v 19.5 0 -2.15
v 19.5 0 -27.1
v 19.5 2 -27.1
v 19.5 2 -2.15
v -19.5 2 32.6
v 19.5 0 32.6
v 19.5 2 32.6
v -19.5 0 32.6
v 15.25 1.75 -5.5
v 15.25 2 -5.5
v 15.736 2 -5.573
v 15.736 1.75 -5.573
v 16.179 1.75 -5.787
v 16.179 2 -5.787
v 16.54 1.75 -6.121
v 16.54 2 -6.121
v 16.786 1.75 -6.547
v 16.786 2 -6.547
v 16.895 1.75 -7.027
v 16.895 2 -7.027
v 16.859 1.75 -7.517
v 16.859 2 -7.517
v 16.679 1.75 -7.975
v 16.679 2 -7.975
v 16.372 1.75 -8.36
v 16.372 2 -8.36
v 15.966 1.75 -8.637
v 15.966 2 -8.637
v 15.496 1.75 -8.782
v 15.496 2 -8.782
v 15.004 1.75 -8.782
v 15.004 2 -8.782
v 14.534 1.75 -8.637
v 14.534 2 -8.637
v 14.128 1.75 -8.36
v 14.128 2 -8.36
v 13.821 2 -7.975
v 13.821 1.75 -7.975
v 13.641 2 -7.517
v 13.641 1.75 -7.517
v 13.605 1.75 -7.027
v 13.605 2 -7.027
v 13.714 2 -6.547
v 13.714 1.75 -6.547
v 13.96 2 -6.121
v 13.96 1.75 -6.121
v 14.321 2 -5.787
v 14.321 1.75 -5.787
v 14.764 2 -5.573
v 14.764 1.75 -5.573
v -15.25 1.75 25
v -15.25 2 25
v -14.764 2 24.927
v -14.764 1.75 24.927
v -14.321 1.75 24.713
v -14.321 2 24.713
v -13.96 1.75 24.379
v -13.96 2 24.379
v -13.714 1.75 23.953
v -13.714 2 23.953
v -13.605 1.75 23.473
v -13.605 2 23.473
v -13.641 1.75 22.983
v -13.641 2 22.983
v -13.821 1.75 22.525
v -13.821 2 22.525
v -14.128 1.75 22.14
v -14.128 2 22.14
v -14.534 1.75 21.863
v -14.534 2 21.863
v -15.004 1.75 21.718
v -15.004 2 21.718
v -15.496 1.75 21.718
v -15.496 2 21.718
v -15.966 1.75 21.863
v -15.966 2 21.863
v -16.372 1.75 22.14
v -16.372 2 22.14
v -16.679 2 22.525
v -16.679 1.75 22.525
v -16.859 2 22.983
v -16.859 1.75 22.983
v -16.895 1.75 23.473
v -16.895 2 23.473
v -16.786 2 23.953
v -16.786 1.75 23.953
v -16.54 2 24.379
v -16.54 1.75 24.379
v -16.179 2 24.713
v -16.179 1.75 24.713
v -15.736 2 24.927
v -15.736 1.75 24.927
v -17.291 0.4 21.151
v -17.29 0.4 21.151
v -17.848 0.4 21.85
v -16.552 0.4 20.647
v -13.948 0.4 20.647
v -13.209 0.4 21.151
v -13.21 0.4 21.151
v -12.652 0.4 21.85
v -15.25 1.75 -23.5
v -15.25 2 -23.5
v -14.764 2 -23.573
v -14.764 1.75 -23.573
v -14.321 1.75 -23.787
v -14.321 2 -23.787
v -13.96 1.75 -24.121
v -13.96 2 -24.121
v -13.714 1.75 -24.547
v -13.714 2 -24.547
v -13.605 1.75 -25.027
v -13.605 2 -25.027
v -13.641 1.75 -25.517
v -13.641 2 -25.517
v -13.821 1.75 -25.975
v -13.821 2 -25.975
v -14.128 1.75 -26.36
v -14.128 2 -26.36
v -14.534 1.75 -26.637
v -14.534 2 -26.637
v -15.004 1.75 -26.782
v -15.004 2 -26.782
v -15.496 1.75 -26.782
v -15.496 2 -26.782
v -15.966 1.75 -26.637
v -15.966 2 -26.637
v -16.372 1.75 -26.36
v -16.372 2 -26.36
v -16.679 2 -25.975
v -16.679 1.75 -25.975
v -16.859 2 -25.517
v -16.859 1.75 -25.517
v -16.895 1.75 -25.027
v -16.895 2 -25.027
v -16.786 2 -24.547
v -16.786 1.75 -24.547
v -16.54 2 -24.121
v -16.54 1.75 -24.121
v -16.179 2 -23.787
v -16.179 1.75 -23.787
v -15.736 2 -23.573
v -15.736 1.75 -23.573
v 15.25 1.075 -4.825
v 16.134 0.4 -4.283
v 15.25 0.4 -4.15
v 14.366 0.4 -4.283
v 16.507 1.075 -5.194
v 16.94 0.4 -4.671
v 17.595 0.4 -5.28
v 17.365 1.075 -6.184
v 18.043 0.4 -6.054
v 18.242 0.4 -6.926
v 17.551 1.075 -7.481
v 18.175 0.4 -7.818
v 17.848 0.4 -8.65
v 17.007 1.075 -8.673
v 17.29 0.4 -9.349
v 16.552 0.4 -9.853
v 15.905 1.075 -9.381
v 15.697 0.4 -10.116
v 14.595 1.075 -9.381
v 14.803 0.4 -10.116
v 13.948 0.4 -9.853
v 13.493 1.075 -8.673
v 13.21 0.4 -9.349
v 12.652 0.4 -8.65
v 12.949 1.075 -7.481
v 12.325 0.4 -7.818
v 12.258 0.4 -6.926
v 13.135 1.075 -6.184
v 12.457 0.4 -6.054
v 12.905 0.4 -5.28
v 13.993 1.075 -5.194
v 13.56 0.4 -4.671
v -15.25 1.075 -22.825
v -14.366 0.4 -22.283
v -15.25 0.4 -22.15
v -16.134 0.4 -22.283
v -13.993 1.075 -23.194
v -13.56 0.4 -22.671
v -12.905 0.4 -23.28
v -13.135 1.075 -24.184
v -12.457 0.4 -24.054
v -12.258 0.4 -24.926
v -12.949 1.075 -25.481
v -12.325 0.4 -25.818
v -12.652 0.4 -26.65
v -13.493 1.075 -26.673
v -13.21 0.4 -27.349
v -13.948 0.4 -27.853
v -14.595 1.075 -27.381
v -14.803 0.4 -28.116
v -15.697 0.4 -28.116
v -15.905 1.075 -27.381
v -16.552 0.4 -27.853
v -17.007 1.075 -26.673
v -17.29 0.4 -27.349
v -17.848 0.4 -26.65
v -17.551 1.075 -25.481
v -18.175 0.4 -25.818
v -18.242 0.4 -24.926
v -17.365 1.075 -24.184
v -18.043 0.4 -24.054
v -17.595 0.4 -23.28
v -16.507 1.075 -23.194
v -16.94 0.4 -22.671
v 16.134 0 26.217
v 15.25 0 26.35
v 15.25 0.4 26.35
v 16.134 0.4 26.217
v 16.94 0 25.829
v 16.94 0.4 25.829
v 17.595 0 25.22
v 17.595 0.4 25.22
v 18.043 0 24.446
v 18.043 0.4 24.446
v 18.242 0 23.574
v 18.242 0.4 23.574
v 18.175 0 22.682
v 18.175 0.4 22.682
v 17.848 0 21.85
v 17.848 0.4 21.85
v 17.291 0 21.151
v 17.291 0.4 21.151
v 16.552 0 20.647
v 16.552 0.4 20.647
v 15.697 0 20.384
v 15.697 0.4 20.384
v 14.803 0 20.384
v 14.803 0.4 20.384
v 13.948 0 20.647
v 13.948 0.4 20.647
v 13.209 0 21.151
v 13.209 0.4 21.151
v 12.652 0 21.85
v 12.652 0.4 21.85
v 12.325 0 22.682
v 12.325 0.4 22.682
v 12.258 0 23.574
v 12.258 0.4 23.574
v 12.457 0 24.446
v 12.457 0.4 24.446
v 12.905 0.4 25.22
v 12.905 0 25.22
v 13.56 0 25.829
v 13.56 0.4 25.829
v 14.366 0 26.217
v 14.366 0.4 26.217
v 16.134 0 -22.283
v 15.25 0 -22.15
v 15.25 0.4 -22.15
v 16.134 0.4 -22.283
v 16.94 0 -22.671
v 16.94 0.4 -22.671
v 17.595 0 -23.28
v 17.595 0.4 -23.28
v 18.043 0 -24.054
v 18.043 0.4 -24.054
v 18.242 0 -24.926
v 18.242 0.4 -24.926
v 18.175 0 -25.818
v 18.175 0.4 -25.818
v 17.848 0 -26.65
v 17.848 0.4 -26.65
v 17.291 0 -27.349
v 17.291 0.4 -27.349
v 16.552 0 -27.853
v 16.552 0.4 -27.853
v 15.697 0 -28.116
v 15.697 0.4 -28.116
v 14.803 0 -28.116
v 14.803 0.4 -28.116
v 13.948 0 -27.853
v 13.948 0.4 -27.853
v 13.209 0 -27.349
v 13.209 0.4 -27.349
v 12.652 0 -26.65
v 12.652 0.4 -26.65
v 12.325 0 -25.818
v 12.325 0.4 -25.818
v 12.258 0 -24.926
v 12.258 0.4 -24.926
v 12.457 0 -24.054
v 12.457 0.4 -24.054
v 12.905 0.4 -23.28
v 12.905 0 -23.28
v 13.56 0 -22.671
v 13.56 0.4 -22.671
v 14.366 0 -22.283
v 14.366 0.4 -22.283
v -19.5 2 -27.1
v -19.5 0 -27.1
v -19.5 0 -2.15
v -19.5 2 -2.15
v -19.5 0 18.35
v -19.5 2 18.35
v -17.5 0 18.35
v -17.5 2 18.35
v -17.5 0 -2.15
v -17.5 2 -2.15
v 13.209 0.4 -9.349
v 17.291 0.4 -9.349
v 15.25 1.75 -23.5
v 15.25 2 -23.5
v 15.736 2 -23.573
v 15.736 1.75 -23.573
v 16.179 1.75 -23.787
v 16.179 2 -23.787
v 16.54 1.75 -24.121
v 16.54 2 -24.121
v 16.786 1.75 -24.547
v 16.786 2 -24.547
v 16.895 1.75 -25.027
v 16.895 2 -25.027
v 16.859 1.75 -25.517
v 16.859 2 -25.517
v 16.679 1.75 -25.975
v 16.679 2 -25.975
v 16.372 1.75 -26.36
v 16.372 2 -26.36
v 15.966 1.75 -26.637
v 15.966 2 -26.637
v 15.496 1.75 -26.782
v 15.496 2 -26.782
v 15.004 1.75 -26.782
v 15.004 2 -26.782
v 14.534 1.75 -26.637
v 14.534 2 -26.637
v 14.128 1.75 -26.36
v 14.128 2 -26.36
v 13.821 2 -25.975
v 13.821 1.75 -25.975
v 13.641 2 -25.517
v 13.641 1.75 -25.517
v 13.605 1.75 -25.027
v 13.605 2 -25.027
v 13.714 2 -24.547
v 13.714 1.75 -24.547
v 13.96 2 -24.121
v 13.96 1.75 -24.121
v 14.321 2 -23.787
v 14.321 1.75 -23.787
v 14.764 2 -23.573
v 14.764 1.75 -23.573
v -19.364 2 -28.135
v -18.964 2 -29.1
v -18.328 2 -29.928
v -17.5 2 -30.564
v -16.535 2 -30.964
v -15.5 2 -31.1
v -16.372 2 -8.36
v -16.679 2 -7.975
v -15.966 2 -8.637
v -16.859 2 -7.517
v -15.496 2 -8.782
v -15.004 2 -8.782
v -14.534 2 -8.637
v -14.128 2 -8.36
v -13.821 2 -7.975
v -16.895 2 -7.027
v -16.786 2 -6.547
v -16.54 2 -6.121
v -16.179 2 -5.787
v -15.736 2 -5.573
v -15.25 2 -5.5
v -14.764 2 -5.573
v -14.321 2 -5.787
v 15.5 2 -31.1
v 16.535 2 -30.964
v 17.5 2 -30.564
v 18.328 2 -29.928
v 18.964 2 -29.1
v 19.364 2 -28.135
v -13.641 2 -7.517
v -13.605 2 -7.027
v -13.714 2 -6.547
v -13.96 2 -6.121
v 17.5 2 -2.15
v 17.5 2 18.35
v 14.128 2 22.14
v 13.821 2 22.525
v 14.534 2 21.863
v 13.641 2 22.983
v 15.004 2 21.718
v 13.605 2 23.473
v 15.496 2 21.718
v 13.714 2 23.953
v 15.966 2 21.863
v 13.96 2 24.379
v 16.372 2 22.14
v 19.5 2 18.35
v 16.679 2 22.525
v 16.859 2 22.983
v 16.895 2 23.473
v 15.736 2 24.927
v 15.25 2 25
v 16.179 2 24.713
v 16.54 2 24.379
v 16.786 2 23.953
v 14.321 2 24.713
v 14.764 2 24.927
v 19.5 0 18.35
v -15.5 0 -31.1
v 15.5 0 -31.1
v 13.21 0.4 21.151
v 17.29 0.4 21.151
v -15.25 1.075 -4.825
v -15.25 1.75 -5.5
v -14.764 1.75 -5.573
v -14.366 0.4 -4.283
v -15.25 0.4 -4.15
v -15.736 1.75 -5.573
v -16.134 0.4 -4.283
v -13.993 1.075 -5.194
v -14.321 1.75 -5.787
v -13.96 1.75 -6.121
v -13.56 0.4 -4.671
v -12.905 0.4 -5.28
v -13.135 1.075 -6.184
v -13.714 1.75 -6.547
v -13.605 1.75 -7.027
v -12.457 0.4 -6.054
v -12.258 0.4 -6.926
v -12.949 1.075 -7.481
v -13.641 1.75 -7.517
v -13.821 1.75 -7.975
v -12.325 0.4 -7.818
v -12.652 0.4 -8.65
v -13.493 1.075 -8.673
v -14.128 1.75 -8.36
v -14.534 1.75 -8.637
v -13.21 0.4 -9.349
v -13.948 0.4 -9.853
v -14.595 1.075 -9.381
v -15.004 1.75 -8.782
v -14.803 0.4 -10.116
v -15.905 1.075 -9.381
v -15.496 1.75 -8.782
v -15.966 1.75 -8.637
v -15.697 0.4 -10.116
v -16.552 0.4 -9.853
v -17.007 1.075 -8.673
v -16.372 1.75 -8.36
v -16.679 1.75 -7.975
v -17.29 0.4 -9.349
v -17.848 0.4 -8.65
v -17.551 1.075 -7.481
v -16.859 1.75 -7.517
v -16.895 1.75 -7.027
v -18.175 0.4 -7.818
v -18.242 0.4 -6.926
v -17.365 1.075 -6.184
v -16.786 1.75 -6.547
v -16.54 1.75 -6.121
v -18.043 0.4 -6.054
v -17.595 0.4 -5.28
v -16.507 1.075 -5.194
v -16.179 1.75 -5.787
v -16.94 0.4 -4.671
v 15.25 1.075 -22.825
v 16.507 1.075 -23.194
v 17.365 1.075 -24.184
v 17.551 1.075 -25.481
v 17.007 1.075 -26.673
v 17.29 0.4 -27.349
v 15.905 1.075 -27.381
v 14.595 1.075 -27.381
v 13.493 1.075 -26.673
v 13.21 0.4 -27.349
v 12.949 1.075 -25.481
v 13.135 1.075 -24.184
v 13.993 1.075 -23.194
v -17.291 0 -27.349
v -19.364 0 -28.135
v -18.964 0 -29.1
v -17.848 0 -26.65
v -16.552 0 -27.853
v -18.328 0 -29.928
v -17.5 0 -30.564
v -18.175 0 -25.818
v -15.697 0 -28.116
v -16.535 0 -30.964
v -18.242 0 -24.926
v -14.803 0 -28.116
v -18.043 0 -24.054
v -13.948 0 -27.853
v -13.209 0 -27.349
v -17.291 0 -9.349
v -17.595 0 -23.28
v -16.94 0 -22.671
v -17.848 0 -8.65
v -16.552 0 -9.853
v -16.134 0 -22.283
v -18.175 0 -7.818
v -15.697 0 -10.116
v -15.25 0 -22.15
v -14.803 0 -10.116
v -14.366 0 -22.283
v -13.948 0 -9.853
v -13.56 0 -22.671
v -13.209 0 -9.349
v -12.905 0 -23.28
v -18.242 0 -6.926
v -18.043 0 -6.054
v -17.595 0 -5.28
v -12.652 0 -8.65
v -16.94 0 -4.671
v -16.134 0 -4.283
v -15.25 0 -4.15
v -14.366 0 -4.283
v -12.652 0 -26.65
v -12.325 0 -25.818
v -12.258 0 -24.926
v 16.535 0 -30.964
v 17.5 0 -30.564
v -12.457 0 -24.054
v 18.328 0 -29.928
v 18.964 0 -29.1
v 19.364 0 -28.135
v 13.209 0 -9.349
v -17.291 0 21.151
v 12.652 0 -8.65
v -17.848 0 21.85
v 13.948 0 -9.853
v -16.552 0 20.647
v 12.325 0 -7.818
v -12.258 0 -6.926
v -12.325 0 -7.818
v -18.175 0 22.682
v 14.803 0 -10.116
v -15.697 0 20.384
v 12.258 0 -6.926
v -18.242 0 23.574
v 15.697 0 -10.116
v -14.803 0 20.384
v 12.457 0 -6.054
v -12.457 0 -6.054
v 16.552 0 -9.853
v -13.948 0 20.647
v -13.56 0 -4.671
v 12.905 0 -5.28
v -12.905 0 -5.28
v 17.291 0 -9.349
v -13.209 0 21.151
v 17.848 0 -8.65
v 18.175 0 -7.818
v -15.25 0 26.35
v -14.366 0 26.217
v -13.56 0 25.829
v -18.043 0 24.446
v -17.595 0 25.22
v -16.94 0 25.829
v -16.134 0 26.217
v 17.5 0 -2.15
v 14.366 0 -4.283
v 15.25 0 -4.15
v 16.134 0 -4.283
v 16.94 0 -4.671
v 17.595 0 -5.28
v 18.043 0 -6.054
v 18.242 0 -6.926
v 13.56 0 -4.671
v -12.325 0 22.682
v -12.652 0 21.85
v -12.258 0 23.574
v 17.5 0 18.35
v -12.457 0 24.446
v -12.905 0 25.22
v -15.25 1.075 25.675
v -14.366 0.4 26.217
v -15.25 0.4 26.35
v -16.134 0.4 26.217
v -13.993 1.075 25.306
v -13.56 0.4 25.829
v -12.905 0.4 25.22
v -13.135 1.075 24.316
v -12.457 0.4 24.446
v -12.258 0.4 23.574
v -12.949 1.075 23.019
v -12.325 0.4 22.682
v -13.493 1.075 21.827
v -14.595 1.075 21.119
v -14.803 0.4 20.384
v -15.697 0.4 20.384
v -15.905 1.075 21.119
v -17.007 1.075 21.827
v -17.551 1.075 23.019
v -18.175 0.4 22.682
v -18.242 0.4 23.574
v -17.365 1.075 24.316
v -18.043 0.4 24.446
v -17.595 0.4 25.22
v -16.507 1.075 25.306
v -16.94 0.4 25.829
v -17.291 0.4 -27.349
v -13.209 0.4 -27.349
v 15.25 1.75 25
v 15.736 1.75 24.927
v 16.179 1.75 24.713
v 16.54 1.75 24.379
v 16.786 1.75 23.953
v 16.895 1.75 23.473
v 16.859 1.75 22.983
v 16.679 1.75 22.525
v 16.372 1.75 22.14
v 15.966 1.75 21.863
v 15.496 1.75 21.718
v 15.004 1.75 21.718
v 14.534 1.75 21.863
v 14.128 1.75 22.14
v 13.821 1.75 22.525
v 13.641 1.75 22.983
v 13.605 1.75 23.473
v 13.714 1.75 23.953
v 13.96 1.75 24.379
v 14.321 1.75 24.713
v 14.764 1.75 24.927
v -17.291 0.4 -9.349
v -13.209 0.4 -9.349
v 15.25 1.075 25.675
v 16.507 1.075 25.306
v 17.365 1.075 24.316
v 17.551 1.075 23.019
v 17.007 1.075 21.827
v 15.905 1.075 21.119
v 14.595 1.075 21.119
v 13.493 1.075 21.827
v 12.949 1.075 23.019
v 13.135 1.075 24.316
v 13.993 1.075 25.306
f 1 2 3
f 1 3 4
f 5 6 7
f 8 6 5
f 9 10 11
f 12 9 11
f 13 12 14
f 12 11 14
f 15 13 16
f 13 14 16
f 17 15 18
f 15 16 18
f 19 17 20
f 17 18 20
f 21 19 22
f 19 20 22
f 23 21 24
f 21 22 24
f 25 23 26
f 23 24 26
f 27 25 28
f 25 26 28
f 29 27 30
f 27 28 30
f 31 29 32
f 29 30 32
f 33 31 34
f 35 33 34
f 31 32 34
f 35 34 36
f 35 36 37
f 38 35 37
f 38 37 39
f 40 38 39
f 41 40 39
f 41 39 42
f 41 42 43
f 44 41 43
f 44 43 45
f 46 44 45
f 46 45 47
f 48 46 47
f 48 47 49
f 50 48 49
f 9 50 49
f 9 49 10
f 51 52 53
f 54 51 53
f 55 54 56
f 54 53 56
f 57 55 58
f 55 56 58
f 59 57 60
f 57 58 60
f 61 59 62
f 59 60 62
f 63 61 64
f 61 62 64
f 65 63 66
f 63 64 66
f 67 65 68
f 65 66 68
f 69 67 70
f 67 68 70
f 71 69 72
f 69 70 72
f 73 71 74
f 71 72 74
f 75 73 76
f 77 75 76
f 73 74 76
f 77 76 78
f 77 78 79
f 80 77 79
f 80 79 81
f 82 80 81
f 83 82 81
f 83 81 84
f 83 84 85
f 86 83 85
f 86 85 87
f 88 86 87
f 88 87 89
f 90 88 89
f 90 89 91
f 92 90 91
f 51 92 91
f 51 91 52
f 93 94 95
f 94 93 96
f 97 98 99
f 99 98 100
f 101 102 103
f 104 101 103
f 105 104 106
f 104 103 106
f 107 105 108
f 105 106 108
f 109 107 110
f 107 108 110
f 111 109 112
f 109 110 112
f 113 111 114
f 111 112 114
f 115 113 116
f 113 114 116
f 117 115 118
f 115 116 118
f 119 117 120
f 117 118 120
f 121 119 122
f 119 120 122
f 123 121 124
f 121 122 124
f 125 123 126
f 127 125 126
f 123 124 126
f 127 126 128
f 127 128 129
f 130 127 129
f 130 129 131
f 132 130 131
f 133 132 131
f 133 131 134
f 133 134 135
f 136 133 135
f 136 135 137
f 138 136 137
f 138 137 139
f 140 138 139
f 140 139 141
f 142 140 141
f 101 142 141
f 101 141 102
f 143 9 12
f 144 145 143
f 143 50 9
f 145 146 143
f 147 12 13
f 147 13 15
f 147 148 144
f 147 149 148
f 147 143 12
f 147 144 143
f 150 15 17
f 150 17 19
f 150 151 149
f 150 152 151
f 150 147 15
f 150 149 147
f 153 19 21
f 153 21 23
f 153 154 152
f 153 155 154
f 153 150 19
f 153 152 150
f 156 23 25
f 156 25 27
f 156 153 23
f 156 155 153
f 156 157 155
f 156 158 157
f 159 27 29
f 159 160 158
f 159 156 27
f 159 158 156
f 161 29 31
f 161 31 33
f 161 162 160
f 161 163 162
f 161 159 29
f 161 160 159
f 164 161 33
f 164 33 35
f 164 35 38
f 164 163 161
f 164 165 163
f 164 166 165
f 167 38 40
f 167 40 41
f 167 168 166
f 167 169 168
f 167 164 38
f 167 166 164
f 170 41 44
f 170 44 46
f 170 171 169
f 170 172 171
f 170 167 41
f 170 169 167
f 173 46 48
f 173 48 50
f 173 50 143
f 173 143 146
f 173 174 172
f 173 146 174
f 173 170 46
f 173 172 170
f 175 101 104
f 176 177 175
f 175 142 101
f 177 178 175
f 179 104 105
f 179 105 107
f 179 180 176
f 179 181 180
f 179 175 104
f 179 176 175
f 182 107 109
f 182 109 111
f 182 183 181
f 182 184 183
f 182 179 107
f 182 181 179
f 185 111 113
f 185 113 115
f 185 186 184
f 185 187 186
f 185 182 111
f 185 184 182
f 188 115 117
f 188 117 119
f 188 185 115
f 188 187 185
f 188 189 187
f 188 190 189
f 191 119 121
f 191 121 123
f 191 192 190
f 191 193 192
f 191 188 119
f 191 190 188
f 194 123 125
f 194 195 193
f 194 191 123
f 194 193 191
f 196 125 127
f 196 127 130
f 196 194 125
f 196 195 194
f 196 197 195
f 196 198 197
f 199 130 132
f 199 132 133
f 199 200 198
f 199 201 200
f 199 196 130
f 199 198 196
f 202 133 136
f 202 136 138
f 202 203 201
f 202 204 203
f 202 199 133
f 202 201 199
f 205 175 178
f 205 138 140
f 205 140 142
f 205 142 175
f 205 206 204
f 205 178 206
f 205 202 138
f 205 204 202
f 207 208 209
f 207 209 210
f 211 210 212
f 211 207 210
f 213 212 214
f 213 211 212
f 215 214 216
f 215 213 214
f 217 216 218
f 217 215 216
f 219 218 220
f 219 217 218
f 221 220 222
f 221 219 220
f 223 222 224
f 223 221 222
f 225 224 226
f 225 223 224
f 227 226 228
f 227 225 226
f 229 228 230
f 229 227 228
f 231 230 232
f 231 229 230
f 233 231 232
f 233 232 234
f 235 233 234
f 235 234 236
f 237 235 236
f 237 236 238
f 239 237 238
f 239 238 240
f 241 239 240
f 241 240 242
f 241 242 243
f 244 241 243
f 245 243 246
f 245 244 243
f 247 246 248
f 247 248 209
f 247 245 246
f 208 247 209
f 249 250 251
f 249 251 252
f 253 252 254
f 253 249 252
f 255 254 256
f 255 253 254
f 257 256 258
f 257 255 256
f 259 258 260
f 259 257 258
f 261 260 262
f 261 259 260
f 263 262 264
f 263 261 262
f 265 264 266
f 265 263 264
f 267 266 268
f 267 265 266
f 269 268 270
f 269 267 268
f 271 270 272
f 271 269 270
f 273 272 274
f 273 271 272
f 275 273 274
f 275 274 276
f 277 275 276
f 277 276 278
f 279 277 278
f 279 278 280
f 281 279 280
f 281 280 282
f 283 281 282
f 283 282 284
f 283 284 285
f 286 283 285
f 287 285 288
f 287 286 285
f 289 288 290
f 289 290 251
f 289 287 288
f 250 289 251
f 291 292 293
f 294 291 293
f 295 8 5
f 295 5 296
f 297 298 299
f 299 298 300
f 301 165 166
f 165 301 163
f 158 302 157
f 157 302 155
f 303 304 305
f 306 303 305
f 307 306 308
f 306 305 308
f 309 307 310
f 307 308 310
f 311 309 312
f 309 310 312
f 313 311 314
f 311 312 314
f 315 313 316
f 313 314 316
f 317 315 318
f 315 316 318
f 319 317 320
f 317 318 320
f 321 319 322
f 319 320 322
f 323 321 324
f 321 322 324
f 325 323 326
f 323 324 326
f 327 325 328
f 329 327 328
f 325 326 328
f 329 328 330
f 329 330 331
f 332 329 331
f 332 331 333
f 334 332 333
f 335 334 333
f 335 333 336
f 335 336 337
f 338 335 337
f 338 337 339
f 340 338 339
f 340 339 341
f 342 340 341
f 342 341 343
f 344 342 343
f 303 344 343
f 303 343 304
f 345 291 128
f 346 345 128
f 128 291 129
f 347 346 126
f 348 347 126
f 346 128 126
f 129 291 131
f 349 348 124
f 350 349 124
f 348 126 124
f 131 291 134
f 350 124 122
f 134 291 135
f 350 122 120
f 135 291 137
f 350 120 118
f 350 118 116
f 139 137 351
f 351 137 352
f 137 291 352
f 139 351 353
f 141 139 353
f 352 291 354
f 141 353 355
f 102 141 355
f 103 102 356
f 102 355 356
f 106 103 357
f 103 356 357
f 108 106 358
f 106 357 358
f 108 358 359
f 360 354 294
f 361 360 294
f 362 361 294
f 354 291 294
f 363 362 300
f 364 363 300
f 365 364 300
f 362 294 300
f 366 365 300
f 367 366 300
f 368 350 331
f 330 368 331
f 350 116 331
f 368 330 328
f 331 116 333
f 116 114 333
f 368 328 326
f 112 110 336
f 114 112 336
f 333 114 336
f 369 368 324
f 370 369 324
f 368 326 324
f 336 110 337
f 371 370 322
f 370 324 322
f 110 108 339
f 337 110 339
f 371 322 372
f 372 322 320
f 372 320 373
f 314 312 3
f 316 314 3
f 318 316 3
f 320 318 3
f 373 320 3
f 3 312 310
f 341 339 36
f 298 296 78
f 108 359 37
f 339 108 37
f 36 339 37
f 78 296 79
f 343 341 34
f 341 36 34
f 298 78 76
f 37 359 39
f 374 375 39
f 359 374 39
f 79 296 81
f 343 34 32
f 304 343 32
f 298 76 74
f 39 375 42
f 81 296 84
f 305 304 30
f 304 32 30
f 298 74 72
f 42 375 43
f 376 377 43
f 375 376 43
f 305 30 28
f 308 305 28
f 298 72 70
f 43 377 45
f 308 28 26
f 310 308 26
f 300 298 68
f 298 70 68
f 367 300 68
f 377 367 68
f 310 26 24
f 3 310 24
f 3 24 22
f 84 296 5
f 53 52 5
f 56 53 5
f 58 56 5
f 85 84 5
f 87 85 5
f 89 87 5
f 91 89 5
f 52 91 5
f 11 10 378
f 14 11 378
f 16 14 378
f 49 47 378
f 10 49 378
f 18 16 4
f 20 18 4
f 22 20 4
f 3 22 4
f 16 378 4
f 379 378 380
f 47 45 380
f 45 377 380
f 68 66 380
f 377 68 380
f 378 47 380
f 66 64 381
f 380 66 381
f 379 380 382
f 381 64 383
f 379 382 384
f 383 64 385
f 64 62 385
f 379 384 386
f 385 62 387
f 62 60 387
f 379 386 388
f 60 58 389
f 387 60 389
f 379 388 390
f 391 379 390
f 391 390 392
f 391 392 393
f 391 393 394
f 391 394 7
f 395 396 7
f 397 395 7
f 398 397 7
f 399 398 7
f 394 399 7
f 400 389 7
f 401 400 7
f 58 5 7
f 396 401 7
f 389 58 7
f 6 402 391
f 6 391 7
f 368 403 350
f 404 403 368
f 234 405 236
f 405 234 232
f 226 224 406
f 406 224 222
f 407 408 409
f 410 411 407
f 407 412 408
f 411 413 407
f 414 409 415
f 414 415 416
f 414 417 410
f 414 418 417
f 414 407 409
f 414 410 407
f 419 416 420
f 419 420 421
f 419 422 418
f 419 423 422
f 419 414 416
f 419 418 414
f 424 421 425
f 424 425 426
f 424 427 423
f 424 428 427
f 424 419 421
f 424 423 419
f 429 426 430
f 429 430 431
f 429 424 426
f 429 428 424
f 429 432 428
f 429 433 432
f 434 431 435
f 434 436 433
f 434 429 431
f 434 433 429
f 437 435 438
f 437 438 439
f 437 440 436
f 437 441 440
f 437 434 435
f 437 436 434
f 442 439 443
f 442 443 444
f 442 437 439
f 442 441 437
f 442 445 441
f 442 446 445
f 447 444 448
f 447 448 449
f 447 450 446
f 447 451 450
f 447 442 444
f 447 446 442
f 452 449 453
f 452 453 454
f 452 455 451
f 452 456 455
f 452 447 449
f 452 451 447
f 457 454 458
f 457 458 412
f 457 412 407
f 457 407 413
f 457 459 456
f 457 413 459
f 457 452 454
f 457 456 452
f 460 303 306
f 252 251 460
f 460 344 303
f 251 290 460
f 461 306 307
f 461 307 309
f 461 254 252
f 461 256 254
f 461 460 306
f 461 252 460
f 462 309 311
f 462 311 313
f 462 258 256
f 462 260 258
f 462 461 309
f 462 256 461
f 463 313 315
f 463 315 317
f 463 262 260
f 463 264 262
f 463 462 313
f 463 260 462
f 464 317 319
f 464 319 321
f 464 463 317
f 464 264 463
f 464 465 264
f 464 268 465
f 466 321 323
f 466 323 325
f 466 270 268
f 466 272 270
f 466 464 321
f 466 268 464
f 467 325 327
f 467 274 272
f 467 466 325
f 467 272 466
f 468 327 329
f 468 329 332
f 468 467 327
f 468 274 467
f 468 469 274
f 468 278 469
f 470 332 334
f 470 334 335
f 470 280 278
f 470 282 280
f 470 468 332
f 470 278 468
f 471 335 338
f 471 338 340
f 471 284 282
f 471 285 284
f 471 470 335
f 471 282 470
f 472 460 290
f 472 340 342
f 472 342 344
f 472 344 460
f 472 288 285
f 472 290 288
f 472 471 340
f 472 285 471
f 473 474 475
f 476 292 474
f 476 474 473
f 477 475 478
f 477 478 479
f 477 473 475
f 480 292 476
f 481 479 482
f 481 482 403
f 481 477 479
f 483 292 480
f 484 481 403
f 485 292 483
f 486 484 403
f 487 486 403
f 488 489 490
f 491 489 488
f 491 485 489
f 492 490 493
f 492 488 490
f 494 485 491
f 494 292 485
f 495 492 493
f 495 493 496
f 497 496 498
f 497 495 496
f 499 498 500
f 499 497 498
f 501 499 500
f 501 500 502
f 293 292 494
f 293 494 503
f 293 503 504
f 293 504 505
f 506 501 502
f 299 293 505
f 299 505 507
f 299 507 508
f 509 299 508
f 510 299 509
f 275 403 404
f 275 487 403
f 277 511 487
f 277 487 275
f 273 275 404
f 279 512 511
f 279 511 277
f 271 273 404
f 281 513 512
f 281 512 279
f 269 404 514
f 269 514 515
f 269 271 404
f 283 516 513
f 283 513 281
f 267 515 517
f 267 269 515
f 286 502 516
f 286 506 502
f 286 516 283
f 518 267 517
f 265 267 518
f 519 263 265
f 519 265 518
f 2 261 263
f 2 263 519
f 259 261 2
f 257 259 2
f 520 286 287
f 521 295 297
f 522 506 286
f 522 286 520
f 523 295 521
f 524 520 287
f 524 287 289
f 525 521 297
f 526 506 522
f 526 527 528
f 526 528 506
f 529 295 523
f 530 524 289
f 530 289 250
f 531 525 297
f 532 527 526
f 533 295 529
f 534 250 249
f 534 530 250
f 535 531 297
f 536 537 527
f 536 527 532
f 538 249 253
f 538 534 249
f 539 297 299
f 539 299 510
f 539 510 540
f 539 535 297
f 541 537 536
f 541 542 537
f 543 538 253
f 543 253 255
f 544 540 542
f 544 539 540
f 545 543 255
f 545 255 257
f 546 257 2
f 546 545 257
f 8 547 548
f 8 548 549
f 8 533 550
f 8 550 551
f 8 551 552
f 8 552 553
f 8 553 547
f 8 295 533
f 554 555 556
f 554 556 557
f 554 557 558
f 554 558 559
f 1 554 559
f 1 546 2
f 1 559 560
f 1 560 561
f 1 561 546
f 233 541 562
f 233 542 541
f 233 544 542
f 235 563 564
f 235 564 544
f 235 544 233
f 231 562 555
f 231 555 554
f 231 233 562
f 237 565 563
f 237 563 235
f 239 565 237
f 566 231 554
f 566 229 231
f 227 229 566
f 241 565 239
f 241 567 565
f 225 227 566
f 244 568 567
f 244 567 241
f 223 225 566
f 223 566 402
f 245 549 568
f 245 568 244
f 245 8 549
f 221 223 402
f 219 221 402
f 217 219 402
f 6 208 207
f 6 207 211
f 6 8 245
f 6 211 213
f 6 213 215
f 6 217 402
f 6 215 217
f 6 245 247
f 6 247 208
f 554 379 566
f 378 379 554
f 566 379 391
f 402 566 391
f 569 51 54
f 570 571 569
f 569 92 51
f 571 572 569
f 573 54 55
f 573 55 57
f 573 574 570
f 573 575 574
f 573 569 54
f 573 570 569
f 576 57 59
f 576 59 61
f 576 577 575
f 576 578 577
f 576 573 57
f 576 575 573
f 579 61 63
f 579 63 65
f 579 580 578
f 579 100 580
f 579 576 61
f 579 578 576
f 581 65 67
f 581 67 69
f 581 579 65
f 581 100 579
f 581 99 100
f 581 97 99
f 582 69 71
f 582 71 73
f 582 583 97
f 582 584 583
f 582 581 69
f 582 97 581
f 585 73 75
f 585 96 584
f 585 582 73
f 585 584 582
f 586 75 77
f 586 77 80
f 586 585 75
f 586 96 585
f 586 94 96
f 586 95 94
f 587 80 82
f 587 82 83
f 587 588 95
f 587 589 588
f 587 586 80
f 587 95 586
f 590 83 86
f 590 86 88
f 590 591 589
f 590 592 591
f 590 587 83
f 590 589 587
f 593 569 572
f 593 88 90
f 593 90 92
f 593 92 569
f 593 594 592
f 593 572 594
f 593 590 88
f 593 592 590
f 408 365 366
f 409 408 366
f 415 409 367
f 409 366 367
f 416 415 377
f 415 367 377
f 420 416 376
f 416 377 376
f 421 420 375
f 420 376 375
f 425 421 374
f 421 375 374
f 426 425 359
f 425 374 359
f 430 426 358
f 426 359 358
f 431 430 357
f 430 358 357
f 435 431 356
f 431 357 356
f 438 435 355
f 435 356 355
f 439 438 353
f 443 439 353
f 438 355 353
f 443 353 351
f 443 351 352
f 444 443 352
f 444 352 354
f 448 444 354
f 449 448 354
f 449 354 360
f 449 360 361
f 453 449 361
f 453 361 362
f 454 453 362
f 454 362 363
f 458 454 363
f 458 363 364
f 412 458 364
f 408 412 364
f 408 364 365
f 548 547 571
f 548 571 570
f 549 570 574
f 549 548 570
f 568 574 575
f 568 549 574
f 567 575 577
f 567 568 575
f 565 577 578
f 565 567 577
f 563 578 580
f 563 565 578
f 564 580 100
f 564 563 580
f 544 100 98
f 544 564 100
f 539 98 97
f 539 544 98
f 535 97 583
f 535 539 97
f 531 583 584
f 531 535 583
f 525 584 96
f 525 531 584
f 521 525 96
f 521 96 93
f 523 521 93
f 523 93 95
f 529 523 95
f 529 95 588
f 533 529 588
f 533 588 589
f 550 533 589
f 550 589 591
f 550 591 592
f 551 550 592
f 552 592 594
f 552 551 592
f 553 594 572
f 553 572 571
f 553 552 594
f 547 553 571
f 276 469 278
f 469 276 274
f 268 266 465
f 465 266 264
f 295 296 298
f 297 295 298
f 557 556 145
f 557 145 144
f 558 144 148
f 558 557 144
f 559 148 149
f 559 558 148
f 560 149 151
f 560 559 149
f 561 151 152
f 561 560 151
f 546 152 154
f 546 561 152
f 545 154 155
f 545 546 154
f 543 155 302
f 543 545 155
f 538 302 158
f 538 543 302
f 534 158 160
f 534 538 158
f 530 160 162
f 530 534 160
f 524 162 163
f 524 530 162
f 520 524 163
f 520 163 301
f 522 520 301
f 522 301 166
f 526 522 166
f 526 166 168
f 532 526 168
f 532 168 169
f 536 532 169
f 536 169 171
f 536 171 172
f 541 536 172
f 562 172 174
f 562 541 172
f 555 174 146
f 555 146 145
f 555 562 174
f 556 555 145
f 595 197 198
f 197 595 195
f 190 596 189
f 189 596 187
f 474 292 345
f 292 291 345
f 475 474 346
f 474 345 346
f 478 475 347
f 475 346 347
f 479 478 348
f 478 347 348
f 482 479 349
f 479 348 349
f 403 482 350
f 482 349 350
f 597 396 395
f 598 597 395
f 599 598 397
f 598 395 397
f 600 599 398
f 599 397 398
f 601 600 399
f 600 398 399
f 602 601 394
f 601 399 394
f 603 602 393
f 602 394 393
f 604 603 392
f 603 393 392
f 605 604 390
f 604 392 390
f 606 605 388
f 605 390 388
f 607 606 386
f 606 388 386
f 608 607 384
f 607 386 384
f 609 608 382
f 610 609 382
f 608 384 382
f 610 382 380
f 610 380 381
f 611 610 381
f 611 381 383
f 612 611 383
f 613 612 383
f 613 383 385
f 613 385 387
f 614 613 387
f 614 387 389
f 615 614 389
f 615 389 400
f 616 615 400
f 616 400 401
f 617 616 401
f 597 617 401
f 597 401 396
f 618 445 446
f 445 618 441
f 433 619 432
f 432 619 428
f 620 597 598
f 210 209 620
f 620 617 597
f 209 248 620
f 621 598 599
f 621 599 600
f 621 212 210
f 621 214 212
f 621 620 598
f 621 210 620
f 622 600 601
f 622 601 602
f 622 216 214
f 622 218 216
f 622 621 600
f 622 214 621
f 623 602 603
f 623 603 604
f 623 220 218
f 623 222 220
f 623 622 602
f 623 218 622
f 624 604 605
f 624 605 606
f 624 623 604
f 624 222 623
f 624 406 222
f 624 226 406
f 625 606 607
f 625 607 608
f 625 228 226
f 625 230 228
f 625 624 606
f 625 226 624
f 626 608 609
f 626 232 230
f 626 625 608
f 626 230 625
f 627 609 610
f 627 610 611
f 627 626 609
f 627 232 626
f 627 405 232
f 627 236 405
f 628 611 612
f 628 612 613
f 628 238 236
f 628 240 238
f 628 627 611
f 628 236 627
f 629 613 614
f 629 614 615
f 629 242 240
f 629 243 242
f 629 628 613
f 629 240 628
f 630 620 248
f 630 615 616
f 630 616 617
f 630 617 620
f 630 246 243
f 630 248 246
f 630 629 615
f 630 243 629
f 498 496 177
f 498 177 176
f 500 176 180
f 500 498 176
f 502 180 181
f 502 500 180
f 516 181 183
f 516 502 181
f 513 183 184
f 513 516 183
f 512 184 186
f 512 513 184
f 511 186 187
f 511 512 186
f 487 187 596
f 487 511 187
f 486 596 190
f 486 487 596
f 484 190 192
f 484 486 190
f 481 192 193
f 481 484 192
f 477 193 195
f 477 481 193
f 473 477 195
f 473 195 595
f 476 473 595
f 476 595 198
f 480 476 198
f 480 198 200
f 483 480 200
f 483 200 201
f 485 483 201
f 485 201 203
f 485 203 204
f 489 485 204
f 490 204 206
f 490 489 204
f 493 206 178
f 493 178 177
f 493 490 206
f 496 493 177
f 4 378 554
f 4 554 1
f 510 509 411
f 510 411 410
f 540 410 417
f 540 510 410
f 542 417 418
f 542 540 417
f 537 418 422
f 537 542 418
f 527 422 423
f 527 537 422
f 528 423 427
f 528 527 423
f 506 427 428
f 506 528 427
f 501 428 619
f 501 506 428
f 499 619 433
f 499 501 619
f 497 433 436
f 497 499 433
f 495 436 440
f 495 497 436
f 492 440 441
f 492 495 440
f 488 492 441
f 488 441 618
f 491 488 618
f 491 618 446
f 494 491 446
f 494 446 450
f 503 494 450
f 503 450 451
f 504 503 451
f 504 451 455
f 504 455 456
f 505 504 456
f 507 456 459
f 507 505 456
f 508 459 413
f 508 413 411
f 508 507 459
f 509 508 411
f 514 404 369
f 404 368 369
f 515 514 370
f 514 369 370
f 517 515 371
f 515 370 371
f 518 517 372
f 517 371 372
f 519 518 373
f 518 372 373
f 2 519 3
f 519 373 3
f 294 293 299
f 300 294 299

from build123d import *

# Parameters (mm, degrees)
SKETCH1_W            = 36
SKETCH1_H            = 62.2
BASE_SHAPE_DEPTH     = 2
CUTOUTS_REACH        = 37.989
SKETCH2_R            = 1.65
SKETCH2_W            = 0.5
SKETCH2_H            = 20.5
SKETCH3_W            = 1.5
SKETCH3_H            = 28.95
SKETCH3_H_2          = 12.75
EXTRA_SIZE_DEPTH     = 2
SKETCH4_R            = 3
SCREW_HEAD_CUT_DEPTH = 0.4
SCREW_CHAMFER_SIZE   = 1.35
FILLET1_R            = 4


with BuildPart() as part:
    # Sketch1 → Base shape (new body)
    with BuildSketch(Plane(origin=(0, 0, 0), x_dir=(1, 0, 0), z_dir=(0, 1, 0))):
        Rectangle(SKETCH1_W, SKETCH1_H)
    extrude(amount=BASE_SHAPE_DEPTH)

    # Sketch2 → Cutouts (cut, up to next)
    with BuildSketch(Plane(origin=(0, 2, 0), x_dir=(1, 0, 0), z_dir=(0, 1, 0)), mode=Mode.PRIVATE) as cutouts_sk1:
        with Locations(Location((-15.25, 7.15, 0), (0, 0, 270))):
            Circle(SKETCH2_R)
    cutouts_tool1 = extrude(cutouts_sk1.sketch, amount=-CUTOUTS_REACH, mode=Mode.PRIVATE) & part.part
    # Sketch2 → Cutouts (cut, up to next)
    with BuildSketch(Plane(origin=(0, 2, 0), x_dir=(1, 0, 0), z_dir=(0, 1, 0)), mode=Mode.PRIVATE) as cutouts_sk2:
        with Locations(Location((15.25, 7.15, 0), (0, 0, 270))):
            Circle(SKETCH2_R)
    cutouts_tool2 = extrude(cutouts_sk2.sketch, amount=-CUTOUTS_REACH, mode=Mode.PRIVATE) & part.part
    # Sketch2 → Cutouts (cut, up to next)
    with BuildSketch(Plane(origin=(0, 2, 0), x_dir=(1, 0, 0), z_dir=(0, 1, 0)), mode=Mode.PRIVATE) as cutouts_sk3:
        with Locations((17.75, -8.1)):
            Rectangle(SKETCH2_W, SKETCH2_H)
    cutouts_tool3 = extrude(cutouts_sk3.sketch, amount=-CUTOUTS_REACH, mode=Mode.PRIVATE) & part.part
    # Sketch2 → Cutouts (cut, up to next)
    with BuildSketch(Plane(origin=(0, 2, 0), x_dir=(1, 0, 0), z_dir=(0, 1, 0)), mode=Mode.PRIVATE) as cutouts_sk4:
        with Locations((-17.75, -8.1)):
            Rectangle(SKETCH2_W, SKETCH2_H)
    cutouts_tool4 = extrude(cutouts_sk4.sketch, amount=-CUTOUTS_REACH, mode=Mode.PRIVATE) & part.part
    # Sketch2 → Cutouts (cut, up to next)
    with BuildSketch(Plane(origin=(0, 2, 0), x_dir=(1, 0, 0), z_dir=(0, 1, 0)), mode=Mode.PRIVATE) as cutouts_sk5:
        with Locations(Location((-15.25, -23.35, 0), (0, 0, 270))):
            Circle(SKETCH2_R)
    cutouts_tool5 = extrude(cutouts_sk5.sketch, amount=-CUTOUTS_REACH, mode=Mode.PRIVATE) & part.part
    # Sketch2 → Cutouts (cut, up to next)
    with BuildSketch(Plane(origin=(0, 2, 0), x_dir=(1, 0, 0), z_dir=(0, 1, 0)), mode=Mode.PRIVATE) as cutouts_sk6:
        with Locations(Location((15.25, -23.35, 0), (0, 0, 270))):
            Circle(SKETCH2_R)
    cutouts_tool6 = extrude(cutouts_sk6.sketch, amount=-CUTOUTS_REACH, mode=Mode.PRIVATE) & part.part
    # Sketch2 → Cutouts (cut, up to next)
    with BuildSketch(Plane(origin=(0, 2, 0), x_dir=(1, 0, 0), z_dir=(0, 1, 0)), mode=Mode.PRIVATE) as cutouts_sk7:
        with Locations(Location((-15.25, 25.15, 0), (0, 0, 270))):
            Circle(SKETCH2_R)
    cutouts_tool7 = extrude(cutouts_sk7.sketch, amount=-CUTOUTS_REACH, mode=Mode.PRIVATE) & part.part
    # Sketch2 → Cutouts (cut, up to next)
    with BuildSketch(Plane(origin=(0, 2, 0), x_dir=(1, 0, 0), z_dir=(0, 1, 0)), mode=Mode.PRIVATE) as cutouts_sk8:
        with Locations(Location((15.25, 25.15, 0), (0, 0, 270))):
            Circle(SKETCH2_R)
    cutouts_tool8 = extrude(cutouts_sk8.sketch, amount=-CUTOUTS_REACH, mode=Mode.PRIVATE) & part.part
    add(cutouts_tool1.solids().sort_by_distance((-15.25, 2, -7.15))[0], mode=Mode.SUBTRACT)
    add(cutouts_tool2.solids().sort_by_distance((15.25, 2, -7.15))[0], mode=Mode.SUBTRACT)
    add(cutouts_tool3.solids().sort_by_distance((17.75, 2, 8.1))[0], mode=Mode.SUBTRACT)
    add(cutouts_tool4.solids().sort_by_distance((-17.75, 2, 8.1))[0], mode=Mode.SUBTRACT)
    add(cutouts_tool5.solids().sort_by_distance((-15.25, 2, 23.35))[0], mode=Mode.SUBTRACT)
    add(cutouts_tool6.solids().sort_by_distance((15.25, 2, 23.35))[0], mode=Mode.SUBTRACT)
    add(cutouts_tool7.solids().sort_by_distance((-15.25, 2, -25.15))[0], mode=Mode.SUBTRACT)
    add(cutouts_tool8.solids().sort_by_distance((15.25, 2, -25.15))[0], mode=Mode.SUBTRACT)

    # Sketch3 → Extra size (add)
    with BuildSketch(Plane.XZ):
        with Locations((-18.75, -16.625)):
            Rectangle(SKETCH3_W, SKETCH3_H)
        with Locations((18.75, -16.625)):
            Rectangle(SKETCH3_W, SKETCH3_H)
        with Locations((-18.75, 24.725)):
            Rectangle(SKETCH3_W, SKETCH3_H_2)
        with Locations((18.75, 24.725)):
            Rectangle(SKETCH3_W, SKETCH3_H_2)
        Polygon((19.5, 31.1), (19.5, 32.6), (-19.5, 32.6), (-19.5, 31.1), (-18, 31.1), (18, 31.1), align=None)
    extrude(amount=-EXTRA_SIZE_DEPTH)

    # Sketch4 → Screw head cut (cut)
    with BuildSketch(Plane(origin=(0, 0, 0), x_dir=(1, 0, 0), z_dir=(0, 1, 0))):
        with Locations(Location((-15.25, 25.15, 0), (0, 0, 270))):
            Circle(SKETCH4_R)
        with Locations(Location((15.25, 25.15, 0), (0, 0, 270))):
            Circle(SKETCH4_R)
        with Locations(Location((15.25, 7.15, 0), (0, 0, 270))):
            Circle(SKETCH4_R)
        with Locations(Location((-15.25, 7.15, 0), (0, 0, 270))):
            Circle(SKETCH4_R)
        with Locations(Location((-15.25, -23.35, 0), (0, 0, 270))):
            Circle(SKETCH4_R)
        with Locations(Location((15.25, -23.35, 0), (0, 0, 270))):
            Circle(SKETCH4_R)
    extrude(amount=SCREW_HEAD_CUT_DEPTH, mode=Mode.SUBTRACT)

    # Screw chamfer
    screw_chamfer_edges = [part.edges().sort_by_distance(p)[0] for p in [
        (-15.25, 0.4, -26.8),
        (15.25, 0.4, 21.7),
        (-15.25, 0.4, 21.7),
        (-15.25, 0.4, -8.8),
        (15.25, 0.4, -8.8),
        (15.25, 0.4, -26.8),
    ]]
    chamfer(screw_chamfer_edges, length=SCREW_CHAMFER_SIZE - 0.0001)  # a hair under: the kernel refuses the full size

    # Fillet1
    fillet1_edges = [part.edges().sort_by_distance(p)[0] for p in [
        (-19.5, 1, -31.1),
        (19.5, 1, -31.1),
    ]]
    fillet(fillet1_edges, radius=FILLET1_R)


solid = part.part
